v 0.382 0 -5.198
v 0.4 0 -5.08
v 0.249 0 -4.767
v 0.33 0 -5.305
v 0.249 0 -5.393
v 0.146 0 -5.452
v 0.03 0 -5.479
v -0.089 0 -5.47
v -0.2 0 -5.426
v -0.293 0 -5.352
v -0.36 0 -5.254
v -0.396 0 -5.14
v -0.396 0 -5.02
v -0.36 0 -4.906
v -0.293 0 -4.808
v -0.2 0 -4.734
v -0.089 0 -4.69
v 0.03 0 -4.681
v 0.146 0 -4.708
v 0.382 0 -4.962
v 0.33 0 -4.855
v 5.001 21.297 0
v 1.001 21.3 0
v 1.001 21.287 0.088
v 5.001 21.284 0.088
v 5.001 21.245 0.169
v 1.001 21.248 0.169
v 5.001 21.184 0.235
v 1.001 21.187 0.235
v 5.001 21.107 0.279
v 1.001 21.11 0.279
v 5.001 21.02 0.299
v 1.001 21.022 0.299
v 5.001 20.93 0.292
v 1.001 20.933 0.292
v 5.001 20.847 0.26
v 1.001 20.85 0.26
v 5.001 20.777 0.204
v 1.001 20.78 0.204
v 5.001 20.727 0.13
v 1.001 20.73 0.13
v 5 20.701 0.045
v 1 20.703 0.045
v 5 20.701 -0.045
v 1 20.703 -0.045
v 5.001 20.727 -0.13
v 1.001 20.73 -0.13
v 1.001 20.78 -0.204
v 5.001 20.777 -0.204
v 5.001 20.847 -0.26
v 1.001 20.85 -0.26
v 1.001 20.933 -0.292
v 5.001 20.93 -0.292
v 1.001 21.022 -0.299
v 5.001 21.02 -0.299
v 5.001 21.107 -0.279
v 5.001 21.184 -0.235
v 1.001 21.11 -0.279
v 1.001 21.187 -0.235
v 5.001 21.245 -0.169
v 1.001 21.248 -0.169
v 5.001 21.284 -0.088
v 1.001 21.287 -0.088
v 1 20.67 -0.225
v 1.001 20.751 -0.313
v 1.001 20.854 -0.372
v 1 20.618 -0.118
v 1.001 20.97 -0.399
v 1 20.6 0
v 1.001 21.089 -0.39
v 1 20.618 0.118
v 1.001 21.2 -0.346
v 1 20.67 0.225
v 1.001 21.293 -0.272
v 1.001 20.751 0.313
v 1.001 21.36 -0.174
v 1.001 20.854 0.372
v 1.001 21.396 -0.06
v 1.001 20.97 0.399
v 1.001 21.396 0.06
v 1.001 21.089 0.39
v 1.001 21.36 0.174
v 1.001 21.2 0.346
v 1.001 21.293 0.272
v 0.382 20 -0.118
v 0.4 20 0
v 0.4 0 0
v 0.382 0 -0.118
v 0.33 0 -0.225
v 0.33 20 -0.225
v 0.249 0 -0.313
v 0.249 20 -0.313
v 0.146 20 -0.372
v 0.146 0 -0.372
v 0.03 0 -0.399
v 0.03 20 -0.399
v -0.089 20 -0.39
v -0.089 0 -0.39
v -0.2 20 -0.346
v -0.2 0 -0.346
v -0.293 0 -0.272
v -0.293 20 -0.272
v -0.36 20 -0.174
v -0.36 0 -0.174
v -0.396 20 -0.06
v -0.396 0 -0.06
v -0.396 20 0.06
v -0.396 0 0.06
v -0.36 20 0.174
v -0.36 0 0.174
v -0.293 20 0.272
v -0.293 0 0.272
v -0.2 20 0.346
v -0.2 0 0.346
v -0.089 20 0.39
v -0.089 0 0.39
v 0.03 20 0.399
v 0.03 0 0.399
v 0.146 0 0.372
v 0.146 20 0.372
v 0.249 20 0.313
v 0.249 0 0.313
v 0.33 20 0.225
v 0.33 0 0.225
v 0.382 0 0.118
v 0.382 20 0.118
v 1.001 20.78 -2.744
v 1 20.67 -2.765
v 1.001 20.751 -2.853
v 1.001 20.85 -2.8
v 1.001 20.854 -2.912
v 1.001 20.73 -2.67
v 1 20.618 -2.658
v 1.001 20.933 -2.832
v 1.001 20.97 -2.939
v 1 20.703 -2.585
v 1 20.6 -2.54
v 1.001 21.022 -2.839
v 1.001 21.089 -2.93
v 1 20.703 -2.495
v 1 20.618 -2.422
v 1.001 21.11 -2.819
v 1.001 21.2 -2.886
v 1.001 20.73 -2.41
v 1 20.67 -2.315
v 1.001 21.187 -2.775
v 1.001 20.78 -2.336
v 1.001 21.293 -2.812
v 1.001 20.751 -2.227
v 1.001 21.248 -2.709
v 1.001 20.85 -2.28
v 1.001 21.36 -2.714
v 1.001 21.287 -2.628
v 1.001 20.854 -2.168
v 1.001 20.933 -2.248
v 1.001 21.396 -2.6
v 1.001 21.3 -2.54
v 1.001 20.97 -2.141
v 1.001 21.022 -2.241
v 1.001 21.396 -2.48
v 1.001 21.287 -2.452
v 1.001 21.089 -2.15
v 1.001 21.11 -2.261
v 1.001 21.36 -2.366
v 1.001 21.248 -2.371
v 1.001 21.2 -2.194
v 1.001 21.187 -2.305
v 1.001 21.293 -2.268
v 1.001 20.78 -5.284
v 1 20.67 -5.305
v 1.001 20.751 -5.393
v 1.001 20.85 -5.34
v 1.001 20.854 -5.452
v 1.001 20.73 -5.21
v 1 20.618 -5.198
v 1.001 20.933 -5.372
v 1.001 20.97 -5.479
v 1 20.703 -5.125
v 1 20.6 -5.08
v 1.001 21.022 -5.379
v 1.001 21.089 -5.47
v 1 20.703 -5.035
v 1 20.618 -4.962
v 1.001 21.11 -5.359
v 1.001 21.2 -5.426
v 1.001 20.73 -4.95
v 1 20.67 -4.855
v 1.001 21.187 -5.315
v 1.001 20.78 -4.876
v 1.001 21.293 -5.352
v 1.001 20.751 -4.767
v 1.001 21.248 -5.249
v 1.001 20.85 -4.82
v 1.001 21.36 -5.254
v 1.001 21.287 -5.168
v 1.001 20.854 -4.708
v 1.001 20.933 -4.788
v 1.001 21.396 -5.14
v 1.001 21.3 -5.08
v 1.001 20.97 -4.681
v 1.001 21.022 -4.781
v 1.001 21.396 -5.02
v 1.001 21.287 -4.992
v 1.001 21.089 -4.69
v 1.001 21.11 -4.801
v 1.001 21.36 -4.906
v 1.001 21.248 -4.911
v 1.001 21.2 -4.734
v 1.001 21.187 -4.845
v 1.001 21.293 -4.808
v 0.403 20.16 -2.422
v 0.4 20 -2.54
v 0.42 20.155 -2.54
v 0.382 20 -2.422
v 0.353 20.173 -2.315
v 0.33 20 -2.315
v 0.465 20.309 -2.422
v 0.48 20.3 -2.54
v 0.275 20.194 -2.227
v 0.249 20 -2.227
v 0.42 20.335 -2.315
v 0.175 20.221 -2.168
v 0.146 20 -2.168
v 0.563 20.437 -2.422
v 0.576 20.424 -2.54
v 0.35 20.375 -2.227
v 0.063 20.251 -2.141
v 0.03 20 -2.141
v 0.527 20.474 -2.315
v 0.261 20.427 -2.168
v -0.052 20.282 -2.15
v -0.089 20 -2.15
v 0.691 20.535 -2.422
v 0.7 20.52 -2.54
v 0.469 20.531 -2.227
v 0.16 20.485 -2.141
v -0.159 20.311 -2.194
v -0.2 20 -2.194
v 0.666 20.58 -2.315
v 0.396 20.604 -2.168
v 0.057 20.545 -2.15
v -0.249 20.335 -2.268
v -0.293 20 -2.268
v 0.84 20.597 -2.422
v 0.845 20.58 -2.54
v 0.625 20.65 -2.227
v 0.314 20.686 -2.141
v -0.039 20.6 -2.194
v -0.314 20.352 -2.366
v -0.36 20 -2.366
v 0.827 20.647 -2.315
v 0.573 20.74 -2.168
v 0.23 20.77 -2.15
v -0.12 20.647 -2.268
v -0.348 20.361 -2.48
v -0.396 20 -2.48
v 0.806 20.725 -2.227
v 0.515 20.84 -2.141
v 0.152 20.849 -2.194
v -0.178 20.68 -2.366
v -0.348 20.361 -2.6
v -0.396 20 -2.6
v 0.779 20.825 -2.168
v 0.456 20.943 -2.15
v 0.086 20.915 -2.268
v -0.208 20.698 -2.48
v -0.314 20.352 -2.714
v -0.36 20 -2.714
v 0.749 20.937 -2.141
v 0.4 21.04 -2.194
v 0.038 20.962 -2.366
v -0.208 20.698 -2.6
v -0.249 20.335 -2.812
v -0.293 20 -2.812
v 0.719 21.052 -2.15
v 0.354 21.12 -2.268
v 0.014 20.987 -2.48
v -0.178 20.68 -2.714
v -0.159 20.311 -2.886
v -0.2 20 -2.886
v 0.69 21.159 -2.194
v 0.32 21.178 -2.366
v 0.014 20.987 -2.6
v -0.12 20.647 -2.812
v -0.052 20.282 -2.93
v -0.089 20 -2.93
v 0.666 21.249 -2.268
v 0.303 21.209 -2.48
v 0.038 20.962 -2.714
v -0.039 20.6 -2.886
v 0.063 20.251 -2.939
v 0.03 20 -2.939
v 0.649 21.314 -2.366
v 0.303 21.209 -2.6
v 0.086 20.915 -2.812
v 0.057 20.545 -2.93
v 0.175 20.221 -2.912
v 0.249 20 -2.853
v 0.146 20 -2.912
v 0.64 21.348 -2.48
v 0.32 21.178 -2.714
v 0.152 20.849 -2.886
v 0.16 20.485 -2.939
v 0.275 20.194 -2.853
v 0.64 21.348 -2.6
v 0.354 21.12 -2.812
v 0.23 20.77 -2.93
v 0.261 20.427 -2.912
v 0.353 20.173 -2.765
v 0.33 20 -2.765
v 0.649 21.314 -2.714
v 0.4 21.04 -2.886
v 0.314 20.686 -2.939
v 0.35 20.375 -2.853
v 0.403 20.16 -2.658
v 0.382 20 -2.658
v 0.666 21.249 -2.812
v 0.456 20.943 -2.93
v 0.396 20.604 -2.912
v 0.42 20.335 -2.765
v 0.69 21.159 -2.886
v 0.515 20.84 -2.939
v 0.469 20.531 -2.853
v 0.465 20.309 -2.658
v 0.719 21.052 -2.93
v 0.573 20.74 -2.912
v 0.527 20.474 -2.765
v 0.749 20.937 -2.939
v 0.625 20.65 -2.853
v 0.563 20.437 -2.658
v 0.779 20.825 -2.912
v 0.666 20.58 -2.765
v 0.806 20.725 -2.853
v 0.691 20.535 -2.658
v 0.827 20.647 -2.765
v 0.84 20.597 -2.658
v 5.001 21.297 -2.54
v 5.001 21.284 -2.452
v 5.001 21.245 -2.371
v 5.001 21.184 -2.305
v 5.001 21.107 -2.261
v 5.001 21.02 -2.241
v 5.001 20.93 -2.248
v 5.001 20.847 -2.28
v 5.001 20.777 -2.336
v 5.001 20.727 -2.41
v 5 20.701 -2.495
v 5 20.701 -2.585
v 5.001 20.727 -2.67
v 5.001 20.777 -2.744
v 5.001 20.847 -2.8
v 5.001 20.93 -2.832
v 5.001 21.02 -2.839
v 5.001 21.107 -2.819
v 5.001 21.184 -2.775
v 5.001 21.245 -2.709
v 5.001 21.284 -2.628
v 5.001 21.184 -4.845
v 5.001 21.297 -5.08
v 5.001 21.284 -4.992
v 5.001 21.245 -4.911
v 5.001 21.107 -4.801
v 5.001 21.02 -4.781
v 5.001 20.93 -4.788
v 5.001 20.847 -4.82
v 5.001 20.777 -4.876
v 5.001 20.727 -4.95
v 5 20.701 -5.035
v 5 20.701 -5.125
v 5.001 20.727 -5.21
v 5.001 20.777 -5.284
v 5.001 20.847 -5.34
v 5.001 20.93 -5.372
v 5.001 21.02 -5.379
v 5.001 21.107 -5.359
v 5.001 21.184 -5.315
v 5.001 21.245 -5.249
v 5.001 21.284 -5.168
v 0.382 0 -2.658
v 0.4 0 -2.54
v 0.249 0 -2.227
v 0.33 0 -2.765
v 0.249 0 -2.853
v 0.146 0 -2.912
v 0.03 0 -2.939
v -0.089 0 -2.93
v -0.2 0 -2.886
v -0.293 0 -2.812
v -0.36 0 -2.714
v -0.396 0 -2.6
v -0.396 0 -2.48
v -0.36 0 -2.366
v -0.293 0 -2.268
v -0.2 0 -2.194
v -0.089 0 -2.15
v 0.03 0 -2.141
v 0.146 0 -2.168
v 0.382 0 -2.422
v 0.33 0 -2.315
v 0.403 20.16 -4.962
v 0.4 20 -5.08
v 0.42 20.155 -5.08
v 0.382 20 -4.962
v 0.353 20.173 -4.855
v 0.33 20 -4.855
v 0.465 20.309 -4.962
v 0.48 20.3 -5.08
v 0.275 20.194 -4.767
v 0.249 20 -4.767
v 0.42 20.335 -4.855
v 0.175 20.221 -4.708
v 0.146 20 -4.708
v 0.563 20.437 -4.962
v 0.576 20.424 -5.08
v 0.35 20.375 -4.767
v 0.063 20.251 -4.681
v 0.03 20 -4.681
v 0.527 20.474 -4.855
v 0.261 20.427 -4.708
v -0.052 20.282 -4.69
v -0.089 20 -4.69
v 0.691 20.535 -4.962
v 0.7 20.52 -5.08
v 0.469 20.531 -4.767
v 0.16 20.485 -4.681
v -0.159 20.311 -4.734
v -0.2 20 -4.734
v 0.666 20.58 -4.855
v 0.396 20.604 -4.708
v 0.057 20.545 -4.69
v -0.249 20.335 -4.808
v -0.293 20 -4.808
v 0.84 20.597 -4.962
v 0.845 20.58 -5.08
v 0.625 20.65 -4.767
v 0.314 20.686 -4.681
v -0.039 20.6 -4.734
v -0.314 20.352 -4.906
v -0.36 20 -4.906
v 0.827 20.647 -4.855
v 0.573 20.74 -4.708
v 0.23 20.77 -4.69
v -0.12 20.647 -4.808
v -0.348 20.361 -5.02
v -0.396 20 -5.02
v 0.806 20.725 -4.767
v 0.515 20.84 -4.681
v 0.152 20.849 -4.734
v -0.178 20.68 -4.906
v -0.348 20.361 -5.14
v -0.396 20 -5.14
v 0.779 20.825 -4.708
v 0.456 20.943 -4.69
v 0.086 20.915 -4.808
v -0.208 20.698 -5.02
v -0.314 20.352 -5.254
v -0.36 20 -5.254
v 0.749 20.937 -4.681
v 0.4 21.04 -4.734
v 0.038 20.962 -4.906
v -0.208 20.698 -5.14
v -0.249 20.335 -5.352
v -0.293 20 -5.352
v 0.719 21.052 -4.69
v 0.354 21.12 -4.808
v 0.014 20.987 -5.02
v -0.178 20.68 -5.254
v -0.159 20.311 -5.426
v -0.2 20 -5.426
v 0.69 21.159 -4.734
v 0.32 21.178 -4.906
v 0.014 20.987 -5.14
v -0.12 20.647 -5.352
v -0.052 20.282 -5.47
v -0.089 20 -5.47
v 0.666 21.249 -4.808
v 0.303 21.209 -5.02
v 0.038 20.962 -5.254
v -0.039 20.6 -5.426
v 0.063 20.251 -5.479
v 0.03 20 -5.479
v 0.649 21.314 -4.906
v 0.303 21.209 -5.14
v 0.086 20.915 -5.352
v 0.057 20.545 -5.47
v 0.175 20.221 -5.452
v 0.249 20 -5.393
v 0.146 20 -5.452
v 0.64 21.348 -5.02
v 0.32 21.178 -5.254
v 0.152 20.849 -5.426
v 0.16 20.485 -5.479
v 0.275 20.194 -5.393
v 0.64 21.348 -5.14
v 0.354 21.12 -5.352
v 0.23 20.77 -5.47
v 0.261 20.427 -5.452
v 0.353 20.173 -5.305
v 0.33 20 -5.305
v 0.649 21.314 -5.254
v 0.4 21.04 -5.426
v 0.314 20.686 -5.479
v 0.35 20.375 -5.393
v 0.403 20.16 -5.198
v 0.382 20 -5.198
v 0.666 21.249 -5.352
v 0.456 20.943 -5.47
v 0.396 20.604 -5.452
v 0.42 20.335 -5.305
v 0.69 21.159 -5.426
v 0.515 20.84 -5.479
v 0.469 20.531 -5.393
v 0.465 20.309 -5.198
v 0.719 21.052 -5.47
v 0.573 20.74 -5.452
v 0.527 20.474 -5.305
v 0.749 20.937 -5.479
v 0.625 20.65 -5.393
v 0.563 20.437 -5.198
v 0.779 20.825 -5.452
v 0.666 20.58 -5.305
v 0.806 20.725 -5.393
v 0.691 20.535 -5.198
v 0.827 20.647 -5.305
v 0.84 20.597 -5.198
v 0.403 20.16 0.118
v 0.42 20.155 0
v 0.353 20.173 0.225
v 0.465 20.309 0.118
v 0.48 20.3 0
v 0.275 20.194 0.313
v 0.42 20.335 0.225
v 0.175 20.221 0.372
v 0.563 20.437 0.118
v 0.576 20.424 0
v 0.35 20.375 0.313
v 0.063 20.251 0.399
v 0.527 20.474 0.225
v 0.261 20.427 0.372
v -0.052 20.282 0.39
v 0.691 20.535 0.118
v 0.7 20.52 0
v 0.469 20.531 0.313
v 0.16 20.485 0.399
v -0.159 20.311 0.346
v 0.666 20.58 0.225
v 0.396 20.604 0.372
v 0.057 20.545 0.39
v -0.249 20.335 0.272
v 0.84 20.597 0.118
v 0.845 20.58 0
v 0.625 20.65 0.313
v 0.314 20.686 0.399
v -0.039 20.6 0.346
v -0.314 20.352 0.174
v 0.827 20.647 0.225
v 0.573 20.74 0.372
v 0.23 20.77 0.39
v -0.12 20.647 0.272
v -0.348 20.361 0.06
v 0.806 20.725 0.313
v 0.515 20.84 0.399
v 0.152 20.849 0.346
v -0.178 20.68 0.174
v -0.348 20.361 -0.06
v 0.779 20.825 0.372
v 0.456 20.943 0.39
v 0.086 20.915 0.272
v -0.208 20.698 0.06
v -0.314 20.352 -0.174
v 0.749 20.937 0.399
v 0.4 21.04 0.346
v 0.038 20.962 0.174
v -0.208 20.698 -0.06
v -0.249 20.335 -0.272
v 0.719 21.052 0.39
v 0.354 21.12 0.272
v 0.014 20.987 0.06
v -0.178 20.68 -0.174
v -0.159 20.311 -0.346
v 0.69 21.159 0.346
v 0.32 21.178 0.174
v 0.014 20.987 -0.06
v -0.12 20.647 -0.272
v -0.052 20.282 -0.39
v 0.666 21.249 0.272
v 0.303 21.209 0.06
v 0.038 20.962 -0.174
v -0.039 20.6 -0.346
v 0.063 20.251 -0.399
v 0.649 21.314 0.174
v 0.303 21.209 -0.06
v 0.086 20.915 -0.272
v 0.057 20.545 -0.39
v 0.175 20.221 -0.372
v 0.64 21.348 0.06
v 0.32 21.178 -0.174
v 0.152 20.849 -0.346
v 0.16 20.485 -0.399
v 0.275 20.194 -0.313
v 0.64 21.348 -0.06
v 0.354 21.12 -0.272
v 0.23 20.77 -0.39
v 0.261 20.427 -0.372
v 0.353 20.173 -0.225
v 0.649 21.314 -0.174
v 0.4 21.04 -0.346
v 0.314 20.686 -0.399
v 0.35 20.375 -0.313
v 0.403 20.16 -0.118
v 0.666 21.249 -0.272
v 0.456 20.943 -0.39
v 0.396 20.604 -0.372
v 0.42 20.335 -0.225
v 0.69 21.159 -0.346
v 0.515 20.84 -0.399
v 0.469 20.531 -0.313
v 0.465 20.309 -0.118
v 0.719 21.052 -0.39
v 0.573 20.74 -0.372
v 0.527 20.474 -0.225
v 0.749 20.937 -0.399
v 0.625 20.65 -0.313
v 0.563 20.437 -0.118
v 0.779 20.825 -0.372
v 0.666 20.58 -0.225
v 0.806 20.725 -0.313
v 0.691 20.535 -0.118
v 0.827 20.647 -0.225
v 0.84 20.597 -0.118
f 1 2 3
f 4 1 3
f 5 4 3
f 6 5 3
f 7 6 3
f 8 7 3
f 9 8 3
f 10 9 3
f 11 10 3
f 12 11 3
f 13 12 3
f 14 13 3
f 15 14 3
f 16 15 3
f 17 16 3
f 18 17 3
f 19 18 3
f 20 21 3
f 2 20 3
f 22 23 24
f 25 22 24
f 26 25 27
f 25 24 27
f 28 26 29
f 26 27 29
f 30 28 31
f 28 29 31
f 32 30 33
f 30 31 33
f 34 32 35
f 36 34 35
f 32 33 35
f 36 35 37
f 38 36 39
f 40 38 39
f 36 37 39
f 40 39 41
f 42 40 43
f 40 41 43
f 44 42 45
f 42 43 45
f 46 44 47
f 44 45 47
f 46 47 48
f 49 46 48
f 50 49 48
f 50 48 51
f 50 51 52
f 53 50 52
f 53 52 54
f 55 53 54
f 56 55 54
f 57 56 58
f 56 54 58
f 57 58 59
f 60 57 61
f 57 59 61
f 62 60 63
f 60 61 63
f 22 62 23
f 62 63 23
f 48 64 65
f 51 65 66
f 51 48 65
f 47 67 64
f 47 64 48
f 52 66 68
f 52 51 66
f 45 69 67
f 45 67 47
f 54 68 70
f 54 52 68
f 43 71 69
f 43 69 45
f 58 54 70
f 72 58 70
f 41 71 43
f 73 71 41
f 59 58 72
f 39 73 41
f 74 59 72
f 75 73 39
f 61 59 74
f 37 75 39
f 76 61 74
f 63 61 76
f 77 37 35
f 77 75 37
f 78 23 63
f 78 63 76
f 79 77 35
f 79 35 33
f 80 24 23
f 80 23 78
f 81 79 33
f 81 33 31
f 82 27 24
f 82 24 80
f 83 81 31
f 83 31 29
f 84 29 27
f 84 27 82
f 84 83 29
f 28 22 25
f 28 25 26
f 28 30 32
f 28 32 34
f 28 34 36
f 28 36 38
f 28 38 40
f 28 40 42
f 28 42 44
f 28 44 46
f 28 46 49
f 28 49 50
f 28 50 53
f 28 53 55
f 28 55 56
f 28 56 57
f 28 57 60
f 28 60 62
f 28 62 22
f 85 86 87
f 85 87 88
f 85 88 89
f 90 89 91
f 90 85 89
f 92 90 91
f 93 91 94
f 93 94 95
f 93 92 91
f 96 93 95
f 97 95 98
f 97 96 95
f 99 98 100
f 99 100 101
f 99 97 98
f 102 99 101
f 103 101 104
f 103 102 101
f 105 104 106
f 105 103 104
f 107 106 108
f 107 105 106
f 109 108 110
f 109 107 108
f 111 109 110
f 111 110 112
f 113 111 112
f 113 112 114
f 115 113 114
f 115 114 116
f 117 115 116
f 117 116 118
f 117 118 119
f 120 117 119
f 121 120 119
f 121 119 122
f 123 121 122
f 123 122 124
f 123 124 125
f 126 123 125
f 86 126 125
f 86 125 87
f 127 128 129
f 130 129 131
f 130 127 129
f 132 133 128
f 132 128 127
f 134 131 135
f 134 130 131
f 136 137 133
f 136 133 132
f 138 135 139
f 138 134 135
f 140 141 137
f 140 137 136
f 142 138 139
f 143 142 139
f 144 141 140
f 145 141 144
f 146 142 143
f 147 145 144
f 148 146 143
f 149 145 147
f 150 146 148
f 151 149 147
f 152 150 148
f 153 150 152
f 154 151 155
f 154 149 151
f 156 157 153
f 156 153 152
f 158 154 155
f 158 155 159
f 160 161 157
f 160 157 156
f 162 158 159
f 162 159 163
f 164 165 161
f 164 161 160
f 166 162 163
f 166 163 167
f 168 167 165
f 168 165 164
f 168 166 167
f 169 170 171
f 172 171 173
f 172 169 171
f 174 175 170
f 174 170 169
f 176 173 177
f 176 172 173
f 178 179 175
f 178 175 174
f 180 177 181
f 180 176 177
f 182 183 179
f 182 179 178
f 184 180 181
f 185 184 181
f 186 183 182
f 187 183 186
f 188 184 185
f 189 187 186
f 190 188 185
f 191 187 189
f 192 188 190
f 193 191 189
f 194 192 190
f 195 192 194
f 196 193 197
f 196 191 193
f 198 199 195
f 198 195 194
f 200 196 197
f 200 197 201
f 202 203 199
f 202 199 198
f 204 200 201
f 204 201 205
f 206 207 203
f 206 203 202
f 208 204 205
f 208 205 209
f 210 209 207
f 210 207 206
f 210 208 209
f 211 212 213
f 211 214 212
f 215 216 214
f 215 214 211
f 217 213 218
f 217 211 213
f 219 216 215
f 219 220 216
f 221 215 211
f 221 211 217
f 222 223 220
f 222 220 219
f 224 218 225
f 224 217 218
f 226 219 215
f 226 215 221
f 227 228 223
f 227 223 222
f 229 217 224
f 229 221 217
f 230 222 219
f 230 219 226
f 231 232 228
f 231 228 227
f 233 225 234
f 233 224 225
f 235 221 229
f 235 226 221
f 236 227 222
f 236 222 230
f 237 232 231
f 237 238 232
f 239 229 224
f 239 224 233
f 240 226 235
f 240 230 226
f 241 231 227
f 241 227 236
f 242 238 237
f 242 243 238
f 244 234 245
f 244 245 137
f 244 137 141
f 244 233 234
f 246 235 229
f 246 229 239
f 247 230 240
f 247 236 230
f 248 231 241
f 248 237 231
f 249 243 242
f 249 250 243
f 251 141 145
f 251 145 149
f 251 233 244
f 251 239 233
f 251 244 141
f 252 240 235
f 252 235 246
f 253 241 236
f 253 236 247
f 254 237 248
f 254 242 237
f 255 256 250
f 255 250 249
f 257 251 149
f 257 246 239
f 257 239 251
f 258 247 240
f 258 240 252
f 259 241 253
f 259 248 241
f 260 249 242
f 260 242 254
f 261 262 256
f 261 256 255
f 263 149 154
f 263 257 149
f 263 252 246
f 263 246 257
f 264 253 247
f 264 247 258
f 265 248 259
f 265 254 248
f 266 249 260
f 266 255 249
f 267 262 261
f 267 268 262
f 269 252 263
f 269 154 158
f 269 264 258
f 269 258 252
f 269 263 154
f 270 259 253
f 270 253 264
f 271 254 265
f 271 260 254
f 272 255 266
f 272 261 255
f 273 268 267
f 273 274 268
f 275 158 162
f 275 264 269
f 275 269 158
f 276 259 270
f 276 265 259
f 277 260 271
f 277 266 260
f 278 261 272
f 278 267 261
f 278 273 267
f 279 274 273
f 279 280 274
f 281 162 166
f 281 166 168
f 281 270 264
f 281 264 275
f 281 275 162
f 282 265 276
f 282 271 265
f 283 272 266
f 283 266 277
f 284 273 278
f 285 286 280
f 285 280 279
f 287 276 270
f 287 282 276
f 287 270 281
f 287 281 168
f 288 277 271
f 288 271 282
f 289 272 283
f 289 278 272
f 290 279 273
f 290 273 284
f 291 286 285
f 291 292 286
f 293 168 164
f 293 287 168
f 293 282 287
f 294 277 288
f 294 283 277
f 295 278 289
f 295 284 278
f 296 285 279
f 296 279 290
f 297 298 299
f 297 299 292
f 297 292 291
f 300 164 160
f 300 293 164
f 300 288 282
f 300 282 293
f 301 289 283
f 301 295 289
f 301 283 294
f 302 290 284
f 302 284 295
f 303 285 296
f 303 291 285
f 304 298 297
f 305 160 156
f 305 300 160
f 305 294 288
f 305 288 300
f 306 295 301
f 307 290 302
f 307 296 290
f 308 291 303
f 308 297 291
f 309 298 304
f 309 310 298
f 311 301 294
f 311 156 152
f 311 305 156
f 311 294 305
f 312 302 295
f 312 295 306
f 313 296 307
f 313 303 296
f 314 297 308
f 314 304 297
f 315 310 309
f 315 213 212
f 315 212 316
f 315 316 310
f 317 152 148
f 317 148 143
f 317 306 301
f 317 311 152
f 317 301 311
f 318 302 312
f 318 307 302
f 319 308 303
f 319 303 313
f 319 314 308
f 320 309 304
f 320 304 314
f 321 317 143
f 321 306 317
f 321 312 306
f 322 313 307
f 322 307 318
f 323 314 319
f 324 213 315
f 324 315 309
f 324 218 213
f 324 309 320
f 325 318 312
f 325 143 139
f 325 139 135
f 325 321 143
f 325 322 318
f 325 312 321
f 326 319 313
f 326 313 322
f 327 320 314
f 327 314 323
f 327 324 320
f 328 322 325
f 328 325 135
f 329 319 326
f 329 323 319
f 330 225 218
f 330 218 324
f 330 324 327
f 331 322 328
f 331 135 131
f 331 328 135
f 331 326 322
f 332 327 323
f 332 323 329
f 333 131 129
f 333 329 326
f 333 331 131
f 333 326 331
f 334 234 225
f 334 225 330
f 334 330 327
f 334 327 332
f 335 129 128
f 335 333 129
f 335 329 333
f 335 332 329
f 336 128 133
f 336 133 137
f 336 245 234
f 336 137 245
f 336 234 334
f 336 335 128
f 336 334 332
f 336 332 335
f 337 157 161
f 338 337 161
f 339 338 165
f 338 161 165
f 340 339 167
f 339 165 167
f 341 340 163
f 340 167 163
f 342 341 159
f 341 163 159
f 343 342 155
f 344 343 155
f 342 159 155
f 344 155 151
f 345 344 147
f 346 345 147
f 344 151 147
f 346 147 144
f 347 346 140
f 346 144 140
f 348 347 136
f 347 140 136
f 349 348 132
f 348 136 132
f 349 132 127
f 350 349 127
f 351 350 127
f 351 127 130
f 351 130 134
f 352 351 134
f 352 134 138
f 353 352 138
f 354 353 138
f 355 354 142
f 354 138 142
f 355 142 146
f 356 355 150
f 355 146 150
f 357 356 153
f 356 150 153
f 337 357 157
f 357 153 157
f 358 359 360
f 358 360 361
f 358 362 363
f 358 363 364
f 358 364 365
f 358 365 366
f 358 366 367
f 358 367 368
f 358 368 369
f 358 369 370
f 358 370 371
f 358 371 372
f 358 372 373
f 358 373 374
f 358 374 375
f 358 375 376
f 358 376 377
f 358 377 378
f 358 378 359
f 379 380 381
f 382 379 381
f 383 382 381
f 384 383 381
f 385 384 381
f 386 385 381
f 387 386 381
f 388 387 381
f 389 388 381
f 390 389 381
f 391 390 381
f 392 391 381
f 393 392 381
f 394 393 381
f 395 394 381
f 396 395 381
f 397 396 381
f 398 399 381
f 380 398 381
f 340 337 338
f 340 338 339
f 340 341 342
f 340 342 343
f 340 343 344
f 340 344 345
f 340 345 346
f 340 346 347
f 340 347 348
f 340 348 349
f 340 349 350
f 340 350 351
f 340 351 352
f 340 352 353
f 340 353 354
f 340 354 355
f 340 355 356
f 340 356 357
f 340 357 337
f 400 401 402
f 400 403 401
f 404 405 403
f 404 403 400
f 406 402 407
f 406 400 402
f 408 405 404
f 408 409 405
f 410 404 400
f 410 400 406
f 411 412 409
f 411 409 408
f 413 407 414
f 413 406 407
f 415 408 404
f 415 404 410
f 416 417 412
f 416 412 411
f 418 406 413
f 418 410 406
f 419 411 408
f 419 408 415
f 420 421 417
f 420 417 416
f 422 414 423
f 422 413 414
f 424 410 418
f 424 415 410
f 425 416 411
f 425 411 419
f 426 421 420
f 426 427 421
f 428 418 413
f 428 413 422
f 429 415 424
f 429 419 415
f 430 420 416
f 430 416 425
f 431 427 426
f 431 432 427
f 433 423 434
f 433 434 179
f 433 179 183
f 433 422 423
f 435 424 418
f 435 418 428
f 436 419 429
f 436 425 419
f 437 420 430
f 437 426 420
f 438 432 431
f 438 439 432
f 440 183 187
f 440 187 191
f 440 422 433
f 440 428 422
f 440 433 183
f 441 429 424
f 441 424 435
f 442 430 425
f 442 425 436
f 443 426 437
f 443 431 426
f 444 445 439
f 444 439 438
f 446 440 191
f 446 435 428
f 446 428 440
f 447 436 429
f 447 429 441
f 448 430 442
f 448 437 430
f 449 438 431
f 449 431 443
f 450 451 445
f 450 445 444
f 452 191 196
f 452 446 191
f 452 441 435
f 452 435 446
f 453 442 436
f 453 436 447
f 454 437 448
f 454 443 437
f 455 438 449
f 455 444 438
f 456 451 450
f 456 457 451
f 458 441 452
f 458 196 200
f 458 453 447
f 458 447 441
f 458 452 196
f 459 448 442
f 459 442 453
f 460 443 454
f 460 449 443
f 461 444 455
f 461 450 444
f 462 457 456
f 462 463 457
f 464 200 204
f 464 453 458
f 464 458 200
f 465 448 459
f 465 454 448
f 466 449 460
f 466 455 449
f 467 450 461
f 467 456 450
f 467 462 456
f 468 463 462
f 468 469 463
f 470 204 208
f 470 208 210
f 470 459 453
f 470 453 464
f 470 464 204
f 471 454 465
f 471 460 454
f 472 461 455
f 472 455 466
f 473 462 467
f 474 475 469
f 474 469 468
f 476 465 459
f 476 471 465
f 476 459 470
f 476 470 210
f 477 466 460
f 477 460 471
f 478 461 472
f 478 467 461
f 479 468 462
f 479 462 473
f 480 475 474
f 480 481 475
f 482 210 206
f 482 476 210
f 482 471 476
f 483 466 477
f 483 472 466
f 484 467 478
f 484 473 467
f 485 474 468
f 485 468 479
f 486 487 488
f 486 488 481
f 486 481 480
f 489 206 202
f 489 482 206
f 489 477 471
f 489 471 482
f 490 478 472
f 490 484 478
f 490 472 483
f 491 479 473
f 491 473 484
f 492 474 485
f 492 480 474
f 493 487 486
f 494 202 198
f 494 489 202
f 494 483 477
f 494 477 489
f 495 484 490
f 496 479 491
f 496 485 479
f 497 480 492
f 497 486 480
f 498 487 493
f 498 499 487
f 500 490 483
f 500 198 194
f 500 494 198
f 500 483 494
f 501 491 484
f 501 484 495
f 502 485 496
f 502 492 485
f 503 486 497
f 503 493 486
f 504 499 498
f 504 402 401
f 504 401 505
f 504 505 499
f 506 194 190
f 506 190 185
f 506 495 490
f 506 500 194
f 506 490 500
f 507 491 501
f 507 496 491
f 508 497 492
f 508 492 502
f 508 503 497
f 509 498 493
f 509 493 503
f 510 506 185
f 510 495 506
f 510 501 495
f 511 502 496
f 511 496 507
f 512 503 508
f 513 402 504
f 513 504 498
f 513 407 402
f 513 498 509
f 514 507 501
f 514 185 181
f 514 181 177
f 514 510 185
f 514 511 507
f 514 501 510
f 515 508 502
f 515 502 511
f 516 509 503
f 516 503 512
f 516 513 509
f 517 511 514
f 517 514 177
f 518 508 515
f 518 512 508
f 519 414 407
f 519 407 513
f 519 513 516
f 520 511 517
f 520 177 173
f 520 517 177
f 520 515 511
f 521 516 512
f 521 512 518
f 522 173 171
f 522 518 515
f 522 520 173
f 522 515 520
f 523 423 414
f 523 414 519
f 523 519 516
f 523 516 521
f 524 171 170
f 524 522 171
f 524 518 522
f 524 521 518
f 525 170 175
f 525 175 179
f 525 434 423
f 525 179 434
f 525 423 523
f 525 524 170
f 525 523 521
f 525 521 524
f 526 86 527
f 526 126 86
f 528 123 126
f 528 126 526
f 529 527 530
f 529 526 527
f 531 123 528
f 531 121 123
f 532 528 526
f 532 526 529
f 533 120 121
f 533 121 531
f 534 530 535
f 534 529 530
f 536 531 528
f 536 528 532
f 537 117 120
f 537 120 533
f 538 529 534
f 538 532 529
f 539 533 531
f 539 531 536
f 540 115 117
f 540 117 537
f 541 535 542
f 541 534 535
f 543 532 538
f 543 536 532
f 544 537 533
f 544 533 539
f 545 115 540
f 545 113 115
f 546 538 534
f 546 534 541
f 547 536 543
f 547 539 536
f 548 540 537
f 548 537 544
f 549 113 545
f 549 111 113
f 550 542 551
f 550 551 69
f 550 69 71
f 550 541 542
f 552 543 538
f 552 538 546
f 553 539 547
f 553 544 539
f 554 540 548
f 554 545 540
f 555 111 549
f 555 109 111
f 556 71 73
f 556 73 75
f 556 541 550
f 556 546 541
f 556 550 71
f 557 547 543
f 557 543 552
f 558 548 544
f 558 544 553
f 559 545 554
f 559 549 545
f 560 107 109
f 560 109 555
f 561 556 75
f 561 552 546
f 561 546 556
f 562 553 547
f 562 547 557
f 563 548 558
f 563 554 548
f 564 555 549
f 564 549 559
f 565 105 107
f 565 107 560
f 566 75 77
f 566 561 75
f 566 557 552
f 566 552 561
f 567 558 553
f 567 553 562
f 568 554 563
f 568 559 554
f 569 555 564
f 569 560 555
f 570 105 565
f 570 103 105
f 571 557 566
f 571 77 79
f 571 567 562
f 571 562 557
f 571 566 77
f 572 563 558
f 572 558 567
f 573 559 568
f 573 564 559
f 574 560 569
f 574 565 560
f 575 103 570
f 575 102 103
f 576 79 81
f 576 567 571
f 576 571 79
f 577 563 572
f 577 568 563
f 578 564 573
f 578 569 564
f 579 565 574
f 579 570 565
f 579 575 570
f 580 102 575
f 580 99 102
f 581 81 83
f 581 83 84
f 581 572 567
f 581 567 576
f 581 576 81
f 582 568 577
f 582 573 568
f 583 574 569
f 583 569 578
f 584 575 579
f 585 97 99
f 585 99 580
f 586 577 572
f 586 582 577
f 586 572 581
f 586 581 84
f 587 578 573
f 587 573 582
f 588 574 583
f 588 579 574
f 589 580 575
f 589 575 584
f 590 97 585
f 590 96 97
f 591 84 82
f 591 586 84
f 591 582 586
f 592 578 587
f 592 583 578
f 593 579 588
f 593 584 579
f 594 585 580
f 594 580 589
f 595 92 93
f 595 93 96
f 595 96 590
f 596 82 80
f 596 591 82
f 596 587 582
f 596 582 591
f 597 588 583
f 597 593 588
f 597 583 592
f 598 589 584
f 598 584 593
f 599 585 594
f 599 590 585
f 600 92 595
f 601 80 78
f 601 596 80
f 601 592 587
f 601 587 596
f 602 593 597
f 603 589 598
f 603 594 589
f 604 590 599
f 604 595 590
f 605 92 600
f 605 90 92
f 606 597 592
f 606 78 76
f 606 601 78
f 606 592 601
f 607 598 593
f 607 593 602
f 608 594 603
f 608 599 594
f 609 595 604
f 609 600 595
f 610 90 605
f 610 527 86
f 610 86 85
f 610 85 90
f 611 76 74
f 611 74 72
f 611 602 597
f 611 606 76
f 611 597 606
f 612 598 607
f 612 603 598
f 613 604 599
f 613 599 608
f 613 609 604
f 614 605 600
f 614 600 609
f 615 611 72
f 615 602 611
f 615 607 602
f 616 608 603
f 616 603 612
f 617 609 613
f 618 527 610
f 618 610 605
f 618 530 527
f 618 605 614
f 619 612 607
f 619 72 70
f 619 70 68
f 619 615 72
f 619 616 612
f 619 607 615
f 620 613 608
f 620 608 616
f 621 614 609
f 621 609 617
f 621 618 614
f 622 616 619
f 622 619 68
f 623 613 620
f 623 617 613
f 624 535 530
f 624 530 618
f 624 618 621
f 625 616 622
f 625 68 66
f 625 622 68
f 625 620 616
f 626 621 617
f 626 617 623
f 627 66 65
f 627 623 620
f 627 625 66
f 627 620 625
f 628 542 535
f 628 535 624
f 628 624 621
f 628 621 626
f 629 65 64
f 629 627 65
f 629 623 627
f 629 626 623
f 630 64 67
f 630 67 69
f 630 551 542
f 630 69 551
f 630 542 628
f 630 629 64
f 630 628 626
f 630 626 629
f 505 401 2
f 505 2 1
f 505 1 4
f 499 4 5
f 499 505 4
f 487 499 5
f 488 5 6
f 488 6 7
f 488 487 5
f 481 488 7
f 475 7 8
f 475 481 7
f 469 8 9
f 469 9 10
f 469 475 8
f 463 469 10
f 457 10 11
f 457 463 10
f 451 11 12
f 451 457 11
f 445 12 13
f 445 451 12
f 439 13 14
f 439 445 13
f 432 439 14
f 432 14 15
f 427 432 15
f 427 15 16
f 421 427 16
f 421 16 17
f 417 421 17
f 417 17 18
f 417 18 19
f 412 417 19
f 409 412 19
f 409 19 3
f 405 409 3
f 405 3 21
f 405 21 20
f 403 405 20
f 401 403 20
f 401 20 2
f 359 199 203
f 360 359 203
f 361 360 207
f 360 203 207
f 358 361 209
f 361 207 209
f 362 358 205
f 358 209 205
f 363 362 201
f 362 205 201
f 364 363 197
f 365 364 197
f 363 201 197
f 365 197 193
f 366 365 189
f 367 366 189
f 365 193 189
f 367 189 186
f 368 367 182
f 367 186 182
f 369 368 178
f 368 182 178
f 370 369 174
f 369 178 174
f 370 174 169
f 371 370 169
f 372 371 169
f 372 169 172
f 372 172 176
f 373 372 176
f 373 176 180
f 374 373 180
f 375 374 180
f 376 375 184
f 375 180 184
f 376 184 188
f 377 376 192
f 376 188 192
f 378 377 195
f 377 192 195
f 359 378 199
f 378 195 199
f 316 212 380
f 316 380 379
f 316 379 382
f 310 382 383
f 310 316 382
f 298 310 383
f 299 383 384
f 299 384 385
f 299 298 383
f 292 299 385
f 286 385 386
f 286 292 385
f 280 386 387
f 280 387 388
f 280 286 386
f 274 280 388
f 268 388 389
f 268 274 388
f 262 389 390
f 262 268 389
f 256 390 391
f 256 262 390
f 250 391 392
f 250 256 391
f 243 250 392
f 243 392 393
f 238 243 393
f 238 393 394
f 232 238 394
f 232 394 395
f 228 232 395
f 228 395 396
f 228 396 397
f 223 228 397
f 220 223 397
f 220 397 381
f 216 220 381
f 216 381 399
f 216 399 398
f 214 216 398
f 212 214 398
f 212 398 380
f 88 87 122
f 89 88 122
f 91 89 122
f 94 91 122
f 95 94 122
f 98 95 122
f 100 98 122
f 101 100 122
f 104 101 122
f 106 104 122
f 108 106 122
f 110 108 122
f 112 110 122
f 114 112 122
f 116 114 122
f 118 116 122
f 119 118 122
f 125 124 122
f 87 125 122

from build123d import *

# Parameters (mm, degrees)
ESQUISSE2_R                = 0.4
ESQUISSE3_R                = 0.3
BOSS_EXTRU_1_DEPTH         = 4
R_P_TITION_LIN_AIRE2_COUNT = 3
R_P_TITION_LIN_AIRE2_PITCH = 2.54


with BuildPart() as part:
    # Balayage1: sweep along a path in Esquisse1
    with BuildLine(Plane.XY) as balayage1_path:
        Line((0, 0), (0, 20))
        ThreePointArc((0, 20), (0.293142298, 20.707355773), (1.000704378, 20.999999752))
    # Esquisse2 → Balayage1 (sweep)
    with BuildSketch(Plane(origin=(0, 0, 0), x_dir=(1, 0, 0), z_dir=(0, 1, 0))):
        Circle(ESQUISSE2_R)
    sweep(path=balayage1_path.line)

    # Esquisse3 → Boss.-Extru.1 (add)
    with BuildSketch(Plane(origin=(0.985911939, -0.000694455, 0), x_dir=(0, 0, -1), z_dir=(0.9999997519254902, -0.000704378419902238, 0))):
        with Locations((0, 21.000699417)):
            Circle(ESQUISSE3_R)
    extrude(amount=BOSS_EXTRU_1_DEPTH)


with BuildPart() as r_p_tition_lin_aire2_1:
    # Répétition linéaire2: pattern copy
    add(part.part.moved(Location(Vector(0, 0, -1) * (1 * R_P_TITION_LIN_AIRE2_PITCH))))


with BuildPart() as r_p_tition_lin_aire2_2:
    # Répétition linéaire2: pattern copy
    add(part.part.moved(Location(Vector(0, 0, -1) * (2 * R_P_TITION_LIN_AIRE2_PITCH))))


solid = Compound([part.part, r_p_tition_lin_aire2_1.part, r_p_tition_lin_aire2_2.part])
